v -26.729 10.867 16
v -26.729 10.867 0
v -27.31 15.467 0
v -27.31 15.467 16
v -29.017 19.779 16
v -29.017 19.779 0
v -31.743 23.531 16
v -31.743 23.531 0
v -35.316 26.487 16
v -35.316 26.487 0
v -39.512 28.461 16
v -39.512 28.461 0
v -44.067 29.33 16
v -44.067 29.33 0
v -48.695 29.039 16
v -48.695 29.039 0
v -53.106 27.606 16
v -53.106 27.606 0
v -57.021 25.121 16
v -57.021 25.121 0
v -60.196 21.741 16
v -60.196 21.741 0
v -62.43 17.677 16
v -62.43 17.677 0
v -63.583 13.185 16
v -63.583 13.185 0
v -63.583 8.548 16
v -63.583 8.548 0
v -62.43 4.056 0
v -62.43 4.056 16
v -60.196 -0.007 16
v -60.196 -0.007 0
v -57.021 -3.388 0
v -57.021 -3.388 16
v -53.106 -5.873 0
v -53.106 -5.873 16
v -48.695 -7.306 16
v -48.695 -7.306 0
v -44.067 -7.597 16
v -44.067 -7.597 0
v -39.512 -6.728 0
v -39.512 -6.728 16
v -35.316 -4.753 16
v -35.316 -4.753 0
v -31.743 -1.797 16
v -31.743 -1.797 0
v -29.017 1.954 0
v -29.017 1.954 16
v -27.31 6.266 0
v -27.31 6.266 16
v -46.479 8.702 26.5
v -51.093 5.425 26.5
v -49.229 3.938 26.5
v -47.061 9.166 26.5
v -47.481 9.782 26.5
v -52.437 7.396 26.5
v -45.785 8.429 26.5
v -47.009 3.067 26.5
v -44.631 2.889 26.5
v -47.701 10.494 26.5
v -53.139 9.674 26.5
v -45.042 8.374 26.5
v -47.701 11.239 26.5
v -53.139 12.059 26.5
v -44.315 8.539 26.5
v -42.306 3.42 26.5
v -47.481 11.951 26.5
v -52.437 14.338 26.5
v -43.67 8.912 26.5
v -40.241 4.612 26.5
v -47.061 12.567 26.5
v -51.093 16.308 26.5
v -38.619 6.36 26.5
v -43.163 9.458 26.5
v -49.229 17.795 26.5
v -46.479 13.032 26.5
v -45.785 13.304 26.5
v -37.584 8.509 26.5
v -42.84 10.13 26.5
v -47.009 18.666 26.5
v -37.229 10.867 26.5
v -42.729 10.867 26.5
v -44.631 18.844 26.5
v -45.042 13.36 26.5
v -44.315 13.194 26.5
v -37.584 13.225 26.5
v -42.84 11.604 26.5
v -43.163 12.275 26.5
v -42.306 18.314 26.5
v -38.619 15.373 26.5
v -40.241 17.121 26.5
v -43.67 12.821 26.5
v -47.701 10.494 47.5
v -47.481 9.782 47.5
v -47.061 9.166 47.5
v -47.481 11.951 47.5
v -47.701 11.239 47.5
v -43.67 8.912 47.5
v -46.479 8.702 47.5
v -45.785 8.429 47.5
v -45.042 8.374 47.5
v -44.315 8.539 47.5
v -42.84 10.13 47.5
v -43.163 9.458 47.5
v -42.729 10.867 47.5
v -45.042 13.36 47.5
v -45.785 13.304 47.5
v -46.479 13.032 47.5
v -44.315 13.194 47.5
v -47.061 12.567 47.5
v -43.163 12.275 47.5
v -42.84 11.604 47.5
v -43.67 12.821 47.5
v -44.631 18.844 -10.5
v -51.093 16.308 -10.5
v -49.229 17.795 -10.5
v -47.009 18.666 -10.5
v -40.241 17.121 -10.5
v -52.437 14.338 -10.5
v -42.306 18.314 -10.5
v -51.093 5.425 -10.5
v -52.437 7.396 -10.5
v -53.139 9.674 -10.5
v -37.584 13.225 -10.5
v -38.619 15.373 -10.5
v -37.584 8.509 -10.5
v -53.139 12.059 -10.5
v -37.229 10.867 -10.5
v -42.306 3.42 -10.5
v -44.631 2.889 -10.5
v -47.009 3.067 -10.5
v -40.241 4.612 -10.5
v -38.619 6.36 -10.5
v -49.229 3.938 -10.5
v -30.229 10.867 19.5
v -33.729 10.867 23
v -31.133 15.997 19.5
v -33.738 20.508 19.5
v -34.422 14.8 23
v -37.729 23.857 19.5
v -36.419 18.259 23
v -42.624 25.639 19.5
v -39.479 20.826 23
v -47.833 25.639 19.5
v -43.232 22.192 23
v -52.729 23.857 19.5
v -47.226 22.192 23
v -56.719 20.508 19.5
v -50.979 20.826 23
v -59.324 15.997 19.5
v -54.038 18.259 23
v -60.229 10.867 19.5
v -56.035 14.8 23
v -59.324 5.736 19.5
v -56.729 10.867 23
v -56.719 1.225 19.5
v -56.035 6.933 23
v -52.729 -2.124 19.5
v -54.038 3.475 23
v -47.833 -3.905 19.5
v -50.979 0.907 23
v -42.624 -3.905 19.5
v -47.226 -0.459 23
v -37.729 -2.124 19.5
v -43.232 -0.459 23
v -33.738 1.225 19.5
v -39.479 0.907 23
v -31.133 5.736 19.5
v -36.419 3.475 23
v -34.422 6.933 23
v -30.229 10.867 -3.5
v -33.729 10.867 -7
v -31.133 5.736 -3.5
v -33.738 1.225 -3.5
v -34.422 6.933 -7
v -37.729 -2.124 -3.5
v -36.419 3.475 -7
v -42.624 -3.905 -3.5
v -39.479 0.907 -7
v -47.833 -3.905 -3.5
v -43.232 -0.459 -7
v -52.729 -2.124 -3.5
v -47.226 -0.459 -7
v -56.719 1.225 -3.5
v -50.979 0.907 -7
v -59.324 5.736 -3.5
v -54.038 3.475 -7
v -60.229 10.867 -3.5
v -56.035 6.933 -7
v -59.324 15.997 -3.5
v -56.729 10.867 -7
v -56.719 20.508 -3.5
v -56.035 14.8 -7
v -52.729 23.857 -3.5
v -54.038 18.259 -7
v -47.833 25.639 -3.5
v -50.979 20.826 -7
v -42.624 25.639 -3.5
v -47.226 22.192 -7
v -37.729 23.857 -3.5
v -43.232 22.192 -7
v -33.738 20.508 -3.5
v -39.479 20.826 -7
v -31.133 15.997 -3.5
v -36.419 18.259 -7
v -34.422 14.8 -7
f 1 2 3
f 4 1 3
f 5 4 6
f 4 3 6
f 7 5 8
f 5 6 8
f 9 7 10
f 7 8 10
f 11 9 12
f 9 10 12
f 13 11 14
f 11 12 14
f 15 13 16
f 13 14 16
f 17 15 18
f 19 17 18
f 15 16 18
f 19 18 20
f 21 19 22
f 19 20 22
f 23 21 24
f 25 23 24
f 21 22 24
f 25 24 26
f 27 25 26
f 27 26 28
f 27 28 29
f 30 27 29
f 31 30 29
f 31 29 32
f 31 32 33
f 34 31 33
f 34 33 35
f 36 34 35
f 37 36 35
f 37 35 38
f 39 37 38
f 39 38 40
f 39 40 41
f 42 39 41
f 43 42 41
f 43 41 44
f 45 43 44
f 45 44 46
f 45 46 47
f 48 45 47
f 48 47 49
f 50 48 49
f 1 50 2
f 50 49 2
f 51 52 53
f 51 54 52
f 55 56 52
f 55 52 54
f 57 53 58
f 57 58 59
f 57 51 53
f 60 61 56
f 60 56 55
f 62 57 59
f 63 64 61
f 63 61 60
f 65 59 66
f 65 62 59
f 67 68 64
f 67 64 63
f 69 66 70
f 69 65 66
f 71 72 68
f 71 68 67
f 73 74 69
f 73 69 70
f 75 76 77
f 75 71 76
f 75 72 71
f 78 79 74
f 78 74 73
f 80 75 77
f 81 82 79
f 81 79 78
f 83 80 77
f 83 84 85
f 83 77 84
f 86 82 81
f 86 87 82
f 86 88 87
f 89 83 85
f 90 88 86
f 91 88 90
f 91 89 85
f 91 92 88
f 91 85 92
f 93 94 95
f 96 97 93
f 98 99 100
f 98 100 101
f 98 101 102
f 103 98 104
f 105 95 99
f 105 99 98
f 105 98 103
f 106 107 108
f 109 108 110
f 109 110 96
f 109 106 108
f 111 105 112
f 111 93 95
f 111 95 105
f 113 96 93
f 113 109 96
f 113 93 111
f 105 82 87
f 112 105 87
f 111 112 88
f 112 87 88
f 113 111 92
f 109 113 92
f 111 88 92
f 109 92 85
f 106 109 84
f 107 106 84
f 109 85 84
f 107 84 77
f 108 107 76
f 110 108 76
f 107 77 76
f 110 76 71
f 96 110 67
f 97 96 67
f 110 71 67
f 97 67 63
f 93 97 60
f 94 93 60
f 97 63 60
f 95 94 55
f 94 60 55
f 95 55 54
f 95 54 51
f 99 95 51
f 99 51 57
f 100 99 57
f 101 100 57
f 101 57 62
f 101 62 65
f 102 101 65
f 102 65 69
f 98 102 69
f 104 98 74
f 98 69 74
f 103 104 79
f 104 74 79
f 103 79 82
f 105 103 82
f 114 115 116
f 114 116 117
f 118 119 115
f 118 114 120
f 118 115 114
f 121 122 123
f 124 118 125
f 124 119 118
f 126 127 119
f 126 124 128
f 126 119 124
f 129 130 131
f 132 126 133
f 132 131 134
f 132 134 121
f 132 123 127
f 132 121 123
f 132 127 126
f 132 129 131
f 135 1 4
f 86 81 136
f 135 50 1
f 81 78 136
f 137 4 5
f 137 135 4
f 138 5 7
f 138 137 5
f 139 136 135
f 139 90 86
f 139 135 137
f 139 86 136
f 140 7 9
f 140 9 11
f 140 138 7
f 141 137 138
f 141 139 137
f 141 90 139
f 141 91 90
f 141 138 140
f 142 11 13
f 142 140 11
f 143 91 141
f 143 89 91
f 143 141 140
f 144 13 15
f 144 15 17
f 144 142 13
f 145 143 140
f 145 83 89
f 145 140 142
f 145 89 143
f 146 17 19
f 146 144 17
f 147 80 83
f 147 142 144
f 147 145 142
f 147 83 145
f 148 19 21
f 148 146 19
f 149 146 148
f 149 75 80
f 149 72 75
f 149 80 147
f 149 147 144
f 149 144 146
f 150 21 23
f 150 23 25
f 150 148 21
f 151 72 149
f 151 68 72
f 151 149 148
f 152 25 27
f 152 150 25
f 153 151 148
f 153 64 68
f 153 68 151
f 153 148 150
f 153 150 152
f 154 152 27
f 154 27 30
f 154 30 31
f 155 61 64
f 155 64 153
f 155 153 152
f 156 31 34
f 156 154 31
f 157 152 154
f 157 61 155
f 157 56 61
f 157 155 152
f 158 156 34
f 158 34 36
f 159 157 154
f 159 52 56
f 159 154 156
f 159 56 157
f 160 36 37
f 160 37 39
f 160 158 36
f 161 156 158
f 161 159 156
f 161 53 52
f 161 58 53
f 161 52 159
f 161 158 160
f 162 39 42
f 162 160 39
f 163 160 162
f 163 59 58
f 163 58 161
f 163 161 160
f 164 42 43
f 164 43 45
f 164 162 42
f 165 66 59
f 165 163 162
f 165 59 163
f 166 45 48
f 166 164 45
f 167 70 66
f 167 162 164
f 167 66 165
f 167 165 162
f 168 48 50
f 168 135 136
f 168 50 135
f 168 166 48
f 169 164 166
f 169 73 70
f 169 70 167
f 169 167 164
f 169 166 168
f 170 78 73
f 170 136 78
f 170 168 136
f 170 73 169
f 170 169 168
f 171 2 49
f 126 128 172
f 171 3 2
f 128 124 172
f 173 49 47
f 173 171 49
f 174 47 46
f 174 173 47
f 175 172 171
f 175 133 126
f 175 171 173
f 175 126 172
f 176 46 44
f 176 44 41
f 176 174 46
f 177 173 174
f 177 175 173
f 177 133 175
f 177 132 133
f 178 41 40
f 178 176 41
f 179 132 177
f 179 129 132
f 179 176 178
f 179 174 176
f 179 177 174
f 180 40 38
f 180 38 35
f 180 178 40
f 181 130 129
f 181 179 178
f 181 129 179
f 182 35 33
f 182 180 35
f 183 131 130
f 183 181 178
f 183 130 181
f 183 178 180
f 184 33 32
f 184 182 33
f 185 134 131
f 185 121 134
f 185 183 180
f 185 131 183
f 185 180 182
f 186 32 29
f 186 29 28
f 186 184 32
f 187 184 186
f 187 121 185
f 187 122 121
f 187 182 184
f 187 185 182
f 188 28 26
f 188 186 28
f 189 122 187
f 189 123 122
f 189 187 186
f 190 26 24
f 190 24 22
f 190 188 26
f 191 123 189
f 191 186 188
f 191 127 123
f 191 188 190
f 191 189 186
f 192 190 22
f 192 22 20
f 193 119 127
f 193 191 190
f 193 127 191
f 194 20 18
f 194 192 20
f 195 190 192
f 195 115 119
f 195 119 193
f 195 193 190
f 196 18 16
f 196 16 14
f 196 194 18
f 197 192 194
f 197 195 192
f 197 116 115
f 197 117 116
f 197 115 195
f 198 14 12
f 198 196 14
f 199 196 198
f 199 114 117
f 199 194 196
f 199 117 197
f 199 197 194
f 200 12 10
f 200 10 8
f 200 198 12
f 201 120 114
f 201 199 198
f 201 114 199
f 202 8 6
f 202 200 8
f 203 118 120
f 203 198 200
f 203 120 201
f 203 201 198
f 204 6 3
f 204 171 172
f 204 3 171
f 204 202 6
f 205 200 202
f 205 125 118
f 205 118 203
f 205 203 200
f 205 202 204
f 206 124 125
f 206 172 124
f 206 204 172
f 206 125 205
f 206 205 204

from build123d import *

# Parameters (mm, degrees)
F0_R     = 18.5
F1_DEPTH = 16
F2_R     = 18.5
F3_DEPTH = 10.5
F4_SIZE2 = 10.5
F4_SIZE  = 10.5
F5_R     = 18.5
F6_DEPTH = 10.5
F7_SIZE2 = 10.5
F7_SIZE  = 10.5
F8_R     = 2.5
F9_DEPTH = 21


with BuildPart() as f1:
    # F0 (on Top) → F1 (new body)
    with BuildSketch(Plane.XY):
        with Locations((-45.2287606895, 10.8666494489)):
            Circle(F0_R)
    extrude(amount=F1_DEPTH)

    # F2 (on face) → F3 (join)
    with BuildSketch(Plane(origin=(0, 0, 0), x_dir=(1, 0, 0), z_dir=(0, 0, -1))):
        with Locations((-45.2287606895, -10.8666494489)):
            Circle(F2_R)
    extrude(amount=F3_DEPTH)

    # F4
    f4_edges = [f1.edges().sort_by_distance(p)[0] for p in [
        (-63.728761, 10.866649, -10.5),
    ]]
    chamfer(f4_edges, length=F4_SIZE, length2=F4_SIZE2)

    # F5 (on face) → F6 (join)
    with BuildSketch(Plane.XY.offset(16)):
        with Locations((-45.2287606895, 10.8666494489)):
            Circle(F5_R)
    extrude(amount=F6_DEPTH)

    # F7
    f7_edges = [f1.edges().sort_by_distance(p)[0] for p in [
        (-63.728761, 10.866649, 26.5),
    ]]
    chamfer(f7_edges, length=F7_SIZE, length2=F7_SIZE2)

    # F8 (on face) → F9 (join)
    with BuildSketch(Plane.XY.offset(26.5)):
        with Locations((-45.2287606895, 10.8666494489)):
            Circle(F8_R)
    extrude(amount=F9_DEPTH)


solid = f1.part
